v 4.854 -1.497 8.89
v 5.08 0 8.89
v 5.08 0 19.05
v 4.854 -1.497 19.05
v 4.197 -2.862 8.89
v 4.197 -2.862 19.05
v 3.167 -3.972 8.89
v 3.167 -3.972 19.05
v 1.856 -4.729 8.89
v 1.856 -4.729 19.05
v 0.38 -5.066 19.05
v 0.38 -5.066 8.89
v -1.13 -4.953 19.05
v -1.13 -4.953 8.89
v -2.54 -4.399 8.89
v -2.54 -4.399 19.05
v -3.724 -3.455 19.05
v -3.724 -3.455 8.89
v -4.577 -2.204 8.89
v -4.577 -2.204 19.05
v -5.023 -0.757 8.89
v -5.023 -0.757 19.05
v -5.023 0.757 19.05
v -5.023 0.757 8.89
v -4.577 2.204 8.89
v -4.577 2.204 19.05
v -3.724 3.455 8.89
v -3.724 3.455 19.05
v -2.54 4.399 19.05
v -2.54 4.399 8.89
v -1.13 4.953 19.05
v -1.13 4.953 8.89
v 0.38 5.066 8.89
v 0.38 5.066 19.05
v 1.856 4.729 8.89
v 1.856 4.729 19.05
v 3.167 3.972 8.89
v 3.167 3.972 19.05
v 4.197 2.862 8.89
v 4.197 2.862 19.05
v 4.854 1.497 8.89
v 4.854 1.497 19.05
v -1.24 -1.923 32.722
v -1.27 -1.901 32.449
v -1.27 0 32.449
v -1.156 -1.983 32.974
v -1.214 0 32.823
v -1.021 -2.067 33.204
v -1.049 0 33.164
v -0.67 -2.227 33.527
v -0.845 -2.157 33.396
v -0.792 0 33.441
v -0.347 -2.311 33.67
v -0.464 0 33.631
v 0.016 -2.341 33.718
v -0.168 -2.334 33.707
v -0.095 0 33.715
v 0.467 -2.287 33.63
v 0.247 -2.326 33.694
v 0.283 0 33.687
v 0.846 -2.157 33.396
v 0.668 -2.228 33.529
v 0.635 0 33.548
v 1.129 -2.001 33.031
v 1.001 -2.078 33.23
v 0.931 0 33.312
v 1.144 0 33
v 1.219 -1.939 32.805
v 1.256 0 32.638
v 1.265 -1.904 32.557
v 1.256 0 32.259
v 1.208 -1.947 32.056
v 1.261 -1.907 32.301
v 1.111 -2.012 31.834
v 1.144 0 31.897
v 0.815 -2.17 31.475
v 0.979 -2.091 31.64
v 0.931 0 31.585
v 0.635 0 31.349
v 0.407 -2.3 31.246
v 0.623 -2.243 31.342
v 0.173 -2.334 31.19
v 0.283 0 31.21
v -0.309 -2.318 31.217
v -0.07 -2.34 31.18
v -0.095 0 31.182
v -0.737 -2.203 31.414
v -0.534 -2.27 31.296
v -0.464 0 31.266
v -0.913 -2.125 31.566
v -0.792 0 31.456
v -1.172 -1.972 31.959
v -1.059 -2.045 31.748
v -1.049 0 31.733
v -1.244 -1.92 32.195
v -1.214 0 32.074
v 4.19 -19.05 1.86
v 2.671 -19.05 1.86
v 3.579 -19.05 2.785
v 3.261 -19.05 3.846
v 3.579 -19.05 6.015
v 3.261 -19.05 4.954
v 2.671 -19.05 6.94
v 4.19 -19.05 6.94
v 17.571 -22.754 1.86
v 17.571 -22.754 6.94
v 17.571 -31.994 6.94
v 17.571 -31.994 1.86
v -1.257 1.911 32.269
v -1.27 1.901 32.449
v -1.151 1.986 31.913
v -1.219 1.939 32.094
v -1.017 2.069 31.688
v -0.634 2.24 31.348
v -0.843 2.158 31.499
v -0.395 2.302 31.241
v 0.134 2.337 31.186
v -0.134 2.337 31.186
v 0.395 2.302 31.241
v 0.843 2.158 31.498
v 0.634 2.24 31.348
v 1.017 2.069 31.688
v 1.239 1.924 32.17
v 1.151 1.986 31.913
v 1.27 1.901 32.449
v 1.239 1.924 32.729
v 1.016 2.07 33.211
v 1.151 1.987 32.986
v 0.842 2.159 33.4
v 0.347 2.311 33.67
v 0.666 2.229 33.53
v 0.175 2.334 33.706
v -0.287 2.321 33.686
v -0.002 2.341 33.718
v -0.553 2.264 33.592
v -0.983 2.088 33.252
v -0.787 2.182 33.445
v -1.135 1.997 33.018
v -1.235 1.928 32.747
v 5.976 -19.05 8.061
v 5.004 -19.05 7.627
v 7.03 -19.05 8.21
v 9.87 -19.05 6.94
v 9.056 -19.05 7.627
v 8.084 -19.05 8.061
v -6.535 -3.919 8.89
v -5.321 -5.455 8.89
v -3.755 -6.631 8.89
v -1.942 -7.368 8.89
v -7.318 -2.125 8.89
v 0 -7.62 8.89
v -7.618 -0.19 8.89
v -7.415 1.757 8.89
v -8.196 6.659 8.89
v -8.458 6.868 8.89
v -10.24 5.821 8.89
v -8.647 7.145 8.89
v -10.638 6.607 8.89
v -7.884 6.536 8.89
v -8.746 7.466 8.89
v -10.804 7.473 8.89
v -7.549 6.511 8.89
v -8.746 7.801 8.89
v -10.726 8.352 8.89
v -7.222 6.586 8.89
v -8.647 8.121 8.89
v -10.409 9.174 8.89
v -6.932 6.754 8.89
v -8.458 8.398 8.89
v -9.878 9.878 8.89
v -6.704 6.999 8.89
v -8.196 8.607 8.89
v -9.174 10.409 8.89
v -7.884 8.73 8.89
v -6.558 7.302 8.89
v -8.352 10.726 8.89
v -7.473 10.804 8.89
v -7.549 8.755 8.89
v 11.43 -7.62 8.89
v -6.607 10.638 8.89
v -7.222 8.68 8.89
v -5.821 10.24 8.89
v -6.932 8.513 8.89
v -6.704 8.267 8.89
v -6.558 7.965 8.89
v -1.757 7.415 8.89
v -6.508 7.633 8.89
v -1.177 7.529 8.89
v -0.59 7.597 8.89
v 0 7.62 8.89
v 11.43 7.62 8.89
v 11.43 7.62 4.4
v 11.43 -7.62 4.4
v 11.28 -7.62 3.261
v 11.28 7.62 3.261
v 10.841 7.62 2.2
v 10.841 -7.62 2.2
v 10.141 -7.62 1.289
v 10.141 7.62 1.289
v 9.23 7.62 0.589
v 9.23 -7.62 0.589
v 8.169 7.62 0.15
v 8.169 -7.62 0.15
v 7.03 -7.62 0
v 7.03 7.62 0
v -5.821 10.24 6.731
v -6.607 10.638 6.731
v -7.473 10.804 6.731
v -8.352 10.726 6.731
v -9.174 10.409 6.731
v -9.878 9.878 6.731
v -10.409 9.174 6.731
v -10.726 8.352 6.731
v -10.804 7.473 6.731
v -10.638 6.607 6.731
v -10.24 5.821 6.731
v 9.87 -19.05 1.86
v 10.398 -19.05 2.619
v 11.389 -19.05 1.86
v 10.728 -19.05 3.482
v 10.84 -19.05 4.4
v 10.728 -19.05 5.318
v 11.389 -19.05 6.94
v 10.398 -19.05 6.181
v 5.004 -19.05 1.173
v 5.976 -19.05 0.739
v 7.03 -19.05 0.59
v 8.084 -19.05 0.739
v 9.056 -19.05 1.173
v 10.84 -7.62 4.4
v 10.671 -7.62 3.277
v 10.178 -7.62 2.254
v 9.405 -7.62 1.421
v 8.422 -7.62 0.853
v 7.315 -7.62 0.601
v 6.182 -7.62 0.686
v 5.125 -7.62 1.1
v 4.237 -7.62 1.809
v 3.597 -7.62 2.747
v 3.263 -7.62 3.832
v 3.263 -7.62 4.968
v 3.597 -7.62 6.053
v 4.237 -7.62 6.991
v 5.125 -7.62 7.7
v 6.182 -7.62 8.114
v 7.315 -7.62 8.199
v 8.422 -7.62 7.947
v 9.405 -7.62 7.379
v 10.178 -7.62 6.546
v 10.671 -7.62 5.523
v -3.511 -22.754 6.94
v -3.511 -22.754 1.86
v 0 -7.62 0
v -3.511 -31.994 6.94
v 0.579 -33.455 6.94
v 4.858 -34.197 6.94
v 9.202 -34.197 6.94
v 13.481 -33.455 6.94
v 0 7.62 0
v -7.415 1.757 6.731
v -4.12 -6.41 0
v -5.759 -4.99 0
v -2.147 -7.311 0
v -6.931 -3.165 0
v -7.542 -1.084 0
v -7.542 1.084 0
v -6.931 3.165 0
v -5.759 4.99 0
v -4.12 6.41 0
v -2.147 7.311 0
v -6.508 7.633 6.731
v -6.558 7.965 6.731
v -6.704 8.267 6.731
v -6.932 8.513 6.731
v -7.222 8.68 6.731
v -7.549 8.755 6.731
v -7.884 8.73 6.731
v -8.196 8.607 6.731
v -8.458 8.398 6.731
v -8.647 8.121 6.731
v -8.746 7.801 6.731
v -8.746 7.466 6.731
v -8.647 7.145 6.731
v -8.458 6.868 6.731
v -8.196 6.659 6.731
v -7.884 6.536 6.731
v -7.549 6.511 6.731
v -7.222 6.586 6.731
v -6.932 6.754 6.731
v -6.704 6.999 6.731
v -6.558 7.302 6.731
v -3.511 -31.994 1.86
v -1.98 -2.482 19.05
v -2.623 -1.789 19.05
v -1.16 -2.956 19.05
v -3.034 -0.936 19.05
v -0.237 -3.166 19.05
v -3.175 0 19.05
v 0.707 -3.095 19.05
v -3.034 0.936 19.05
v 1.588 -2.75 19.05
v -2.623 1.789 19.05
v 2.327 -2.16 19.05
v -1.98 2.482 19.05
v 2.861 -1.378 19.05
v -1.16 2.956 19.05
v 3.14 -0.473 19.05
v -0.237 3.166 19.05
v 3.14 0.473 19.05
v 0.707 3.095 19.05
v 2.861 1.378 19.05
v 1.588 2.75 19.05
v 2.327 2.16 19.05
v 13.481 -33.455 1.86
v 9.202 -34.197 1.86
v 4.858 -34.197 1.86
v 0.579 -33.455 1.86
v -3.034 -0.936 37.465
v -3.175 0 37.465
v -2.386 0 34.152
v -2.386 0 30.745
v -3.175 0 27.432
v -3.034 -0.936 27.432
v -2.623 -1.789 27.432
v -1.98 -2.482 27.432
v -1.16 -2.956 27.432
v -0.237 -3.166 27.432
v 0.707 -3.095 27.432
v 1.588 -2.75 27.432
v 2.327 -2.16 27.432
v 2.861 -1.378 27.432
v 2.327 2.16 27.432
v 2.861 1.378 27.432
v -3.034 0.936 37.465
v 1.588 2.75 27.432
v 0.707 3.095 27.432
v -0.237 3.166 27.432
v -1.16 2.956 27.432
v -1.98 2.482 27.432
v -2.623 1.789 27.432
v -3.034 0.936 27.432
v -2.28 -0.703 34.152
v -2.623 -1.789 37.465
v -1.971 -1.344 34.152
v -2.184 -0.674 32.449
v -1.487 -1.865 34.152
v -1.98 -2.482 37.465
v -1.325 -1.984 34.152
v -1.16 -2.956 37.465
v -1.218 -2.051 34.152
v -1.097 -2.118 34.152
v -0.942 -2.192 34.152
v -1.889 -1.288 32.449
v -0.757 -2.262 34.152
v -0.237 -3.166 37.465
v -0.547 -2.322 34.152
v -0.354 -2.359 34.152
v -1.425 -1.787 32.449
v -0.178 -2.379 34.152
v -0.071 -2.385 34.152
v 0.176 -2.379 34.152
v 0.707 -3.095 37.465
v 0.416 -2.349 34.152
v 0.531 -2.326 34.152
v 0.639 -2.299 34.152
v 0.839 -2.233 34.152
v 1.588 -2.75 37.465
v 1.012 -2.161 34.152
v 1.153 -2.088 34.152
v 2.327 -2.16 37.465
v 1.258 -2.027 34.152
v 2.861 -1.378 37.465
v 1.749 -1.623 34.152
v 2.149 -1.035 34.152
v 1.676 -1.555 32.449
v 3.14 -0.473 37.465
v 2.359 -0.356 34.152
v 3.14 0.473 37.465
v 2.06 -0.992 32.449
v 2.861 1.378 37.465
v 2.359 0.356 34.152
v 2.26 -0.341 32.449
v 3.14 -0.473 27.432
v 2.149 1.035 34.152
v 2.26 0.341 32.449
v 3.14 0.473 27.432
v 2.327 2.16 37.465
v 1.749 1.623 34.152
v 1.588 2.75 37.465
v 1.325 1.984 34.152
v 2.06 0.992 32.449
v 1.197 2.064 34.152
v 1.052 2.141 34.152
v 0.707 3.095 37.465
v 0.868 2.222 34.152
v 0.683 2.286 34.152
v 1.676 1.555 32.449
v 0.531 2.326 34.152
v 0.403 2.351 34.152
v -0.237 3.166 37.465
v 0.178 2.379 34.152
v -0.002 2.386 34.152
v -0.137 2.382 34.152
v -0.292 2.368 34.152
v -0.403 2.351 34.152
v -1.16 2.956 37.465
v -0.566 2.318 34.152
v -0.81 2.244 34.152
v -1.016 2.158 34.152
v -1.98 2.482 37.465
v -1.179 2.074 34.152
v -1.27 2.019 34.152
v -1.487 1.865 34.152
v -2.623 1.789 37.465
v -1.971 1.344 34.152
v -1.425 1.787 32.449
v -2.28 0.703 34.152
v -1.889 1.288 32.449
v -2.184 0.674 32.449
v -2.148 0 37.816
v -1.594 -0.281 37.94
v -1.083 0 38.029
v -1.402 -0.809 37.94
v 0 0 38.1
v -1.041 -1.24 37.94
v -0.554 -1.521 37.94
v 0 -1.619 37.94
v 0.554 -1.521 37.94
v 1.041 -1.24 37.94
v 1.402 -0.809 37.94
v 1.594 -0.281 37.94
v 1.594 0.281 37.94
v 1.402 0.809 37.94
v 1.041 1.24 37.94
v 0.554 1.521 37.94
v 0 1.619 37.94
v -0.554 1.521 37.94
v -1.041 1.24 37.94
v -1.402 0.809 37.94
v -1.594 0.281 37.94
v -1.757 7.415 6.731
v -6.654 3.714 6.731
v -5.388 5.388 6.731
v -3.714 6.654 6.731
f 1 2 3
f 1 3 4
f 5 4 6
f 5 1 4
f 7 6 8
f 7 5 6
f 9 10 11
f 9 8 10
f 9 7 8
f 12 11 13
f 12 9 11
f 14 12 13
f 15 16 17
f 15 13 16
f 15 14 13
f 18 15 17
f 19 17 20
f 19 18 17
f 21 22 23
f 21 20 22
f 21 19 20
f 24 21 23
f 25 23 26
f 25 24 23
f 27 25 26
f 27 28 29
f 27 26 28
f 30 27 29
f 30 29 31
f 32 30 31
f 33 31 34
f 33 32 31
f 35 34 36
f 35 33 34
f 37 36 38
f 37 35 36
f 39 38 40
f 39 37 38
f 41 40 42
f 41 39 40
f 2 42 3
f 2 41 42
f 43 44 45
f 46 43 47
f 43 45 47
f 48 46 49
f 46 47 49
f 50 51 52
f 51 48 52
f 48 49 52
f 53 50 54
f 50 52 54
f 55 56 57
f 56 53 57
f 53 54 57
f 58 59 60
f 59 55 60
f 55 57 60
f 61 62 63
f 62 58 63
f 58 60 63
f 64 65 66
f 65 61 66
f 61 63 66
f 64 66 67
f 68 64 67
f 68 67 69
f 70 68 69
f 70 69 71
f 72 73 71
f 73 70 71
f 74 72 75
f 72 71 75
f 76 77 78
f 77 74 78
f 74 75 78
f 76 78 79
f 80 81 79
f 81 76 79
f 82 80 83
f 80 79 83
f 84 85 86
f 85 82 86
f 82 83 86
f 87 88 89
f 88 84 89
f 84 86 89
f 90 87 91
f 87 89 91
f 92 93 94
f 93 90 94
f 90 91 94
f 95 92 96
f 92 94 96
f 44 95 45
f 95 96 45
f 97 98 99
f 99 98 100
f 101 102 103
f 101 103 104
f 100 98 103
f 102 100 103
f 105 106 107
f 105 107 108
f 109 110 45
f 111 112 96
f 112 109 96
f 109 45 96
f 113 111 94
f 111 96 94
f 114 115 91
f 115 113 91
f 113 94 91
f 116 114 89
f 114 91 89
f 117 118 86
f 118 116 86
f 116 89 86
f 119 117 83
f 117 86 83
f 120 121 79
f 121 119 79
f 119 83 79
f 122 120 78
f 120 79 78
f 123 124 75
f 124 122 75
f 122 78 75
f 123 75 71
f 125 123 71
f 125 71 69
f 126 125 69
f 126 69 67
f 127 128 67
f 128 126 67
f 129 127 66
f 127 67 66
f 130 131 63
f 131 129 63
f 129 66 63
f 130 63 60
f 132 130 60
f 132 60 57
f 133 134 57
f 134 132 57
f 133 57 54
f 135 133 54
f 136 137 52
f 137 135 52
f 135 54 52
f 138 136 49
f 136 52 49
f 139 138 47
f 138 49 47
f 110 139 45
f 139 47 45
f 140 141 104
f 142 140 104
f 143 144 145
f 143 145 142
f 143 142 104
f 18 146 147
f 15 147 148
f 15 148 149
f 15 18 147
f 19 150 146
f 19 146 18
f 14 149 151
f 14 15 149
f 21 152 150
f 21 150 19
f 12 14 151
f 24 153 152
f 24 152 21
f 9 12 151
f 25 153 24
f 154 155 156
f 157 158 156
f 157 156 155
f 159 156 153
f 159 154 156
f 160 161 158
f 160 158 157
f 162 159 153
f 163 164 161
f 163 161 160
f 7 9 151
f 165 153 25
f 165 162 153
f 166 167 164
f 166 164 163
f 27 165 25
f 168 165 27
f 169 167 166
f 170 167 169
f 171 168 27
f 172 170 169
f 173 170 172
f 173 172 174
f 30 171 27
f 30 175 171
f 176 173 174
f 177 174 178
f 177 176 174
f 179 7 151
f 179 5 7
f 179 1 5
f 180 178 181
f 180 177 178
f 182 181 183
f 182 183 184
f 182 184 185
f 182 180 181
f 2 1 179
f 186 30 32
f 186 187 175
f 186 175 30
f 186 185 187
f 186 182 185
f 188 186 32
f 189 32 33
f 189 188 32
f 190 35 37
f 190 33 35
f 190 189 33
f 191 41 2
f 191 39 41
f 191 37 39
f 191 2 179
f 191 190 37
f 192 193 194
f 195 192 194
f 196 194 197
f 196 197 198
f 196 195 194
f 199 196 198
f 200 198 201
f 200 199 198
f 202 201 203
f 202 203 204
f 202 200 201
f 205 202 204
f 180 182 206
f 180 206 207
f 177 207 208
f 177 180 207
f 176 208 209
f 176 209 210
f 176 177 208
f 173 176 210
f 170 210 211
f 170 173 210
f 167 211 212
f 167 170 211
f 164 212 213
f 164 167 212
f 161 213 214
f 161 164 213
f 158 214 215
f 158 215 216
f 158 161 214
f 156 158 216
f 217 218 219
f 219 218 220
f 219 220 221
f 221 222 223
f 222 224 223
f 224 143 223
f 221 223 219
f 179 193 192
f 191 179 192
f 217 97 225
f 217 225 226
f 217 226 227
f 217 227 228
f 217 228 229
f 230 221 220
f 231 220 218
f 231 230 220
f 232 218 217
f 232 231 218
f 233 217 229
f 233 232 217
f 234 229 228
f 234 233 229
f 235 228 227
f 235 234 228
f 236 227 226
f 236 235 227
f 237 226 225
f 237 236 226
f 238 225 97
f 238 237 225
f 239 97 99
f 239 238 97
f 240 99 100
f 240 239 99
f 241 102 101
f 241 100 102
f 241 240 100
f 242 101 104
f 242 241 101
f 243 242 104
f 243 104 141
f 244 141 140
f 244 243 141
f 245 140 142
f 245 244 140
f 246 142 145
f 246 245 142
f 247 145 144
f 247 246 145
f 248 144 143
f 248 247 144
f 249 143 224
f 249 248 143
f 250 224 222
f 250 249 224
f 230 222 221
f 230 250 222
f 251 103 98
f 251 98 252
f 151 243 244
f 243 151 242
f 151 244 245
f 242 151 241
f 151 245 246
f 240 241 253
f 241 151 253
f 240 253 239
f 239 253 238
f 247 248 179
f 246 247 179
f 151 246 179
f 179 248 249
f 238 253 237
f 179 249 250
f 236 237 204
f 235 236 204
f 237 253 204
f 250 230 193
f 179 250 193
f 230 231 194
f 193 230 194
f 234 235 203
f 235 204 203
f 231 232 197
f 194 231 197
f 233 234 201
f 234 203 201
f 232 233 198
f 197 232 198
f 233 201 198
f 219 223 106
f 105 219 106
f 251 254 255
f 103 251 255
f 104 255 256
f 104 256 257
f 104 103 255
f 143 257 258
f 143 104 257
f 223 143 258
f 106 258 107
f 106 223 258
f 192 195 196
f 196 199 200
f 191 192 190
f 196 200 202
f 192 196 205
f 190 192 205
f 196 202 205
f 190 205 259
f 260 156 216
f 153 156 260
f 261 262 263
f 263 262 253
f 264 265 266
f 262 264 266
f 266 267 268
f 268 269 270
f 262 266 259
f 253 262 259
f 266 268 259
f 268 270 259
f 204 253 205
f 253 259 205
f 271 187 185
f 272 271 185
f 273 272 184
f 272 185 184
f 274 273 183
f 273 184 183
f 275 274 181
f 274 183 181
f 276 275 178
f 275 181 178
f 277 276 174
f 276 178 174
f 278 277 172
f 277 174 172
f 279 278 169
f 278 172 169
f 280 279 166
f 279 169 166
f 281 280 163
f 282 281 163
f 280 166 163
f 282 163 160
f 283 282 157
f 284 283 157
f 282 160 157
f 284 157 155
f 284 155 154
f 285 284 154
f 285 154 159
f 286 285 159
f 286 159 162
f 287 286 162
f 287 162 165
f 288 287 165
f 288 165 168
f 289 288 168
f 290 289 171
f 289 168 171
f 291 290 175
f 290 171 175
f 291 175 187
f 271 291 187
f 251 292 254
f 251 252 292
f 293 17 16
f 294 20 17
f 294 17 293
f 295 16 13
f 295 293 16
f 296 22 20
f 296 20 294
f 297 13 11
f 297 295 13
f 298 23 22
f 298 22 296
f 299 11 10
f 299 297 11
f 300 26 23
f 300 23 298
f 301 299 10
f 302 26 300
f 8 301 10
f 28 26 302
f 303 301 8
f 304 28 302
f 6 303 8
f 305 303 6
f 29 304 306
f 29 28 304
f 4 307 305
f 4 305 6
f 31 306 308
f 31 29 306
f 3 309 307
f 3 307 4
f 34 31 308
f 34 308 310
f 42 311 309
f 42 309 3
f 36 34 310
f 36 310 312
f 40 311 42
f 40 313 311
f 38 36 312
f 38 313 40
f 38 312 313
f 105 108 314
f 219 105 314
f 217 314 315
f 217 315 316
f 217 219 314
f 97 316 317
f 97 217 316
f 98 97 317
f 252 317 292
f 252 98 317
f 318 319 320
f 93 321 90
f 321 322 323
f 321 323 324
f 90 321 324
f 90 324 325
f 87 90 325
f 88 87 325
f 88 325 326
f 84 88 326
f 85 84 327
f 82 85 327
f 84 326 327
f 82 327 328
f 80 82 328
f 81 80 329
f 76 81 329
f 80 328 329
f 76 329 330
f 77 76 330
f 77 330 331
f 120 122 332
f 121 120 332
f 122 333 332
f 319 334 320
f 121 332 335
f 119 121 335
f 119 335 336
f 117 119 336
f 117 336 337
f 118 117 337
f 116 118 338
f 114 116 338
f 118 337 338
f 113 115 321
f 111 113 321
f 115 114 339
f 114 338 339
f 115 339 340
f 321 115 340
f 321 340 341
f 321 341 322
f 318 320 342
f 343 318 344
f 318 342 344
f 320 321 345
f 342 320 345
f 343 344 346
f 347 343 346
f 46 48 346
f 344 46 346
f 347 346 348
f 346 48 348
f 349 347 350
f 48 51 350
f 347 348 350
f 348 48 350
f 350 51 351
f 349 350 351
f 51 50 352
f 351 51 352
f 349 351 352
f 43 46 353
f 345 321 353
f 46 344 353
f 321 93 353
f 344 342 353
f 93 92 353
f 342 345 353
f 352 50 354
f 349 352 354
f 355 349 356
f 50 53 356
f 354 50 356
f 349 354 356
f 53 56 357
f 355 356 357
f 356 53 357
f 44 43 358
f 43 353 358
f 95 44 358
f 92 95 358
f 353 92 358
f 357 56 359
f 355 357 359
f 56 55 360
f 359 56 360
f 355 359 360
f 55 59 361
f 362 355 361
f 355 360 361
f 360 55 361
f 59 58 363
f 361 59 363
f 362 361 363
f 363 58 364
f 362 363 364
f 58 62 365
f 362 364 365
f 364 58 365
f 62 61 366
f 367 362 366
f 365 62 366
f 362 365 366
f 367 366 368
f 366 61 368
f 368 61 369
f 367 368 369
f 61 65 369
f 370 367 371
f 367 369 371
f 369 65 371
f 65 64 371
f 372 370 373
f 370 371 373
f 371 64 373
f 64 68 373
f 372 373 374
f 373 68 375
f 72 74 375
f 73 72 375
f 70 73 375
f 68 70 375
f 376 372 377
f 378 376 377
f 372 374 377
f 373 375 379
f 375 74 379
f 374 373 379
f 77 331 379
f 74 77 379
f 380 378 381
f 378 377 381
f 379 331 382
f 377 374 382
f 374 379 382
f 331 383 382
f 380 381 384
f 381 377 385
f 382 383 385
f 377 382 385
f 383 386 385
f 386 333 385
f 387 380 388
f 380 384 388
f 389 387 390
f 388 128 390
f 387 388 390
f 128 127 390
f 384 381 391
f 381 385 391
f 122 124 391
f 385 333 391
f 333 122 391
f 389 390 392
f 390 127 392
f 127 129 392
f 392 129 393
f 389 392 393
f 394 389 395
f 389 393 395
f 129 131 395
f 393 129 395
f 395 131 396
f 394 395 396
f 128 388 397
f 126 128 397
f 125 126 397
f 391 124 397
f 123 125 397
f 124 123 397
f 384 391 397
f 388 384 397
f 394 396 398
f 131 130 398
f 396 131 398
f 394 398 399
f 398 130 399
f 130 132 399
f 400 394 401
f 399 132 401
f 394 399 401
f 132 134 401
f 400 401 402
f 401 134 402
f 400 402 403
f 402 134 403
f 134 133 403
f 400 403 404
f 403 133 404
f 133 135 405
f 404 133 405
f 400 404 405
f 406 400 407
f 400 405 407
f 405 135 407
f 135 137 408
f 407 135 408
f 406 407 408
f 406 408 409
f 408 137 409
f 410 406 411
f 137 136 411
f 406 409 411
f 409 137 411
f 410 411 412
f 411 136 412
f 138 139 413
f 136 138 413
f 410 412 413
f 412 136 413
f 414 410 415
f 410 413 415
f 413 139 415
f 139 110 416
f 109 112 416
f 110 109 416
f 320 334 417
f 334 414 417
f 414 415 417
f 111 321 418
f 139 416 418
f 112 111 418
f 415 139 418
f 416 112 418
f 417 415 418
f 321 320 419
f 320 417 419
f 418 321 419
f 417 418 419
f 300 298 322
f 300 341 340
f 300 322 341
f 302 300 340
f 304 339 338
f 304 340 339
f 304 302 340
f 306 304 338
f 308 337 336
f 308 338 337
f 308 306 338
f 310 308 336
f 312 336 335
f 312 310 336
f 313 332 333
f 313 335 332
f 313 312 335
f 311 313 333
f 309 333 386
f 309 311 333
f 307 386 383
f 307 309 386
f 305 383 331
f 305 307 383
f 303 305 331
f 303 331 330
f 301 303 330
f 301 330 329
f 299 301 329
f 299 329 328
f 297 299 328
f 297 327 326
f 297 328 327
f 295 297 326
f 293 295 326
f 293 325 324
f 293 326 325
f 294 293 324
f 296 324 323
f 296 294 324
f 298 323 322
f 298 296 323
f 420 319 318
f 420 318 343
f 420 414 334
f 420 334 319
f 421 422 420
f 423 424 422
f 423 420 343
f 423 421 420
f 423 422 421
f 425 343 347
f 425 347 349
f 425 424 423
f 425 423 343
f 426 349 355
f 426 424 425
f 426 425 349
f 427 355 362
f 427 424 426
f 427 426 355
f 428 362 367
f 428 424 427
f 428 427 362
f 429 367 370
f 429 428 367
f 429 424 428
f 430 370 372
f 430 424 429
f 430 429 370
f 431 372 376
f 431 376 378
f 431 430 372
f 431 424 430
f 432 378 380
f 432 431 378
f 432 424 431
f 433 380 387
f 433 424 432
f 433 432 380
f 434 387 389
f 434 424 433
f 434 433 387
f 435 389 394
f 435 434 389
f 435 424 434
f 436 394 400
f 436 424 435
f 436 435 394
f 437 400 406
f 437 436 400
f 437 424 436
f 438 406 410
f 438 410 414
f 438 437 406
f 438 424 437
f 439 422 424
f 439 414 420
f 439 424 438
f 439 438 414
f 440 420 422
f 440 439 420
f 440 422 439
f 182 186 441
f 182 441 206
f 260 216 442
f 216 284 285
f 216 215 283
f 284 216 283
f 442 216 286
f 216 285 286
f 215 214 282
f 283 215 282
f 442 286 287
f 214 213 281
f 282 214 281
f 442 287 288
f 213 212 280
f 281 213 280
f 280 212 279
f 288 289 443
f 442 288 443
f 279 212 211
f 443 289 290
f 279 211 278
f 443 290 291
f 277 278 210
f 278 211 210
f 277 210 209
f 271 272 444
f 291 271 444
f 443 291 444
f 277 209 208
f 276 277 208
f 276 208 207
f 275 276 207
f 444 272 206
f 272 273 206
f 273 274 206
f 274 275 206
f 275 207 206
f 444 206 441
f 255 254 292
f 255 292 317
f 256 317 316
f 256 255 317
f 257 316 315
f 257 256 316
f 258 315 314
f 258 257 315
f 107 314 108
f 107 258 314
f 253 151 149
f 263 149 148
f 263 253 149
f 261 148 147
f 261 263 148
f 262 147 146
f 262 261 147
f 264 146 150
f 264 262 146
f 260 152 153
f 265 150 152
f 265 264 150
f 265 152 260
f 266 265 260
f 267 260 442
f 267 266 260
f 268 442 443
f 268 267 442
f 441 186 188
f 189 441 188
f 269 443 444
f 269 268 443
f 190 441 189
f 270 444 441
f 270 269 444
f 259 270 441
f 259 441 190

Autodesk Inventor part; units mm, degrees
ref_plane "YZ Plane" through (0, 0, 0) normal (1, 0, 0) x (0, 1, 0)
ref_plane "XZ Plane" through (0, 0, 0) normal (0, 1, 0) x (-1, 0, 0)
ref_plane "XY Plane" through (0, 0, 0) normal (0, 0, 1) x (1, 0, 0)
sketch "Sketch1" plane through (0, 0, 0) normal (0, 0, 1) x (1, 0, 0)
  line L0 (11.43, 7.62) -> (0, 7.62)
  arc A0 (0, 7.62) -> (0, -7.62) centre (0, 0) ccw
  line L1 (0, -7.62) -> (11.43, -7.62)
  line L2 (11.43, -7.62) -> (11.43, 7.62)
  dimension "d0" = 15.24
  dimension "d2" = 11.43
extrude "Extrusion1" add sketch "Sketch1" along normal blind 8.89
sketch "Sketch2" plane through (0, 0, 8.89) normal (0, 0, 1) x (1, 0, 0)
  arc A0 (0, 7.62) -> (0, -7.62) centre (0, 0) ccw projected
  circle A1 centre (0, 0) radius 5.08
  dimension "d5" = 10.16
extrude "Extrusion2" add sketch "Sketch2" along normal blind 10.16
sketch "Sketch3" plane through (0, 0, 0) normal (0, 1, 0) x (-1, 0, 0)
  line L0 (7.62, 8.89) -> (7.62, 0) projected
  line L1 (7.62, 0) -> (-11.43, 0) projected
  line L2 (-11.43, 0) -> (-11.43, 8.89) projected
  line L3 (-11.43, 8.89) -> (-5.08, 8.89) projected
  line L4 (-5.08, 8.89) -> (-5.08, 19.05) projected
  line L5 (-5.08, 19.05) -> (5.08, 19.05) projected
  line L6 (5.08, 19.05) -> (5.08, 8.89) projected
  line L7 (5.08, 8.89) -> (7.62, 8.89) projected
  line L8 (0, 19.05) -> (0, 38.1)
  arc A0 (3.175, 37.465) -> (0, 38.1) centre (0, 29.845) ccw
  arc A1 (3.175, 37.465) -> (3.175, 27.432) centre (16.8842, 32.4485) ccw
  line L9 (3.175, 27.432) -> (3.175, 19.05)
  line L10 (3.175, 19.05) -> (0, 19.05)
  line L11 (16.8842, 32.4485) -> (2.286, 32.4485)
  point P0 (0, 0)
  dimension "d10" = 3.175
  dimension "d13" = 8.382
  dimension "d14" = 2.286
  dimension "d15" = 19.05
  dimension "d16" = 0.635
revolve "Revolution1" add sketch "Sketch3" angle 360 about axis through (0, 0, 19.05) along (0, 0, 1) contours L5 L8 A0 A1 L9
sketch "Sketch4" plane through (0, 0, 0) normal (0, 1, 0) x (-1, 0, 0)
  line L0 (7.62, 8.89) -> (7.62, 0) projected
  line L1 (7.62, 0) -> (-11.43, 0) projected
  line L2 (-11.43, 0) -> (-11.43, 8.89) projected
  line L3 (-11.43, 8.89) -> (-5.08, 8.89) projected
  line L4 (-5.08, 8.89) -> (-5.08, 19.05) projected
  line L5 (-5.08, 19.05) -> (-3.175, 19.05) projected
  line L6 (-3.175, 19.05) -> (-3.175, 27.432) projected
  arc A0 (-3.175, 27.432) -> (-3.175, 37.465) centre (-16.8842, 32.4485) ccw projected
  arc A1 (3.175, 37.465) -> (0, 38.1) centre (0, 29.845) ccw projected
  arc A2 (0, 38.1) -> (-3.175, 37.465) centre (0, 29.845) ccw projected
  arc A3 (3.175, 37.465) -> (3.175, 27.432) centre (16.8842, 32.4485) ccw projected
  line L7 (3.175, 27.432) -> (3.175, 19.05) projected
  line L8 (3.175, 19.05) -> (5.08, 19.05) projected
  line L9 (5.08, 19.05) -> (5.08, 8.89) projected
  line L10 (5.08, 8.89) -> (7.62, 8.89) projected
  circle A4 centre (0, 32.4485) radius 1.27
  point P0 (0, 0)
  point P1 (2.286, 32.4485)
  dimension "d18" = 2.54
extrude "Extrusion3" cut sketch "Sketch4" along normal through all both and the other way through all contours A4
sketch "Sketch5" plane through (0, 0, 8.89) normal (0, 0, 1) x (1, 0, 0)
  circle A0 centre (0, 0) radius 5.08 projected
  arc A1 (0, 7.62) -> (0, -7.62) centre (0, 0) ccw projected
  line L0 (-1.7571, 7.4147) -> (-5.8207, 10.24)
  arc A2 (-5.8207, 10.24) -> (-10.24, 5.8207) centre (-7.6332, 7.6332) ccw
  line L1 (-10.24, 5.8207) -> (-7.4147, 1.7571)
  circle A3 centre (-7.6332, 7.6332) radius 1.125
  circle A4 centre (0, 0) radius 10.795
  line L2 (0, 0) -> (-7.6332, 7.6332)
  line L3 (11.43, 7.62) -> (0, 7.62) projected
  dimension "d23" = 2.25
  dimension "d25" = 3.175
  dimension "d26" = 8.001
  dimension "d27" = 5.715
  dimension "d31" = 135
extrude "Extrusion4" add sketch "Sketch5" against normal blind 2.159 contours A1 L1 A4 A3 L2 | L2 A3 A4 L0 A1 | A4 A3 L1 A2 L0
fillet "Fillet1" radius 4.4 1 edges at (11.43, 0, 0)
sketch "Sketch6" plane through (0, -7.62, 8.89) normal (0, -1, 0) x (1, 0, 0)
  arc A0 (7.03, -8.89) -> (11.43, -4.49) centre (7.03, -4.49) ccw projected
  circle A1 centre (7.03, -4.49) radius 3.81
  dimension "d33" = 7.62
extrude "Extrusion5" add sketch "Sketch6" along normal blind 11.43
sketch "Sketch7" plane through (7.03, -19.05, 4.4) normal (0, -1, 0) x (1, 0, 0)
  circle A0 centre (0, 0) radius 3.81 projected
  line L0 (-10.541, 2.54) -> (10.541, 2.54)
  line L1 (10.541, 2.54) -> (10.541, -2.54)
  line L2 (10.541, -2.54) -> (-10.541, -2.54)
  line L3 (-10.541, -2.54) -> (-10.541, 2.54)
  point P0 (-7.03, -4.4)
  point P1 (0, 2.54)
  point P2 (10.541, 0)
  dimension "d37" = 21.082
  dimension "d40" = 5.08
extrude "Extrusion6" add sketch "Sketch7" along normal blind 15.24 contours A0 L2 L0 | A0 L0 L1 L2 | A0 L2 L3 L0
sketch "Sketch8" plane through (-3.511, -19.05, 6.94) normal (0, 0, 1) x (1, 0, 0)
  line L0 (0, 0) -> (7.7012, 0) projected
  line L1 (0, 0) -> (0, -15.24) projected
  line L2 (21.082, -15.24) -> (0, -15.24) projected
  line L3 (21.082, 0) -> (21.082, -15.24) projected
  line L4 (13.3808, 0) -> (21.082, 0) projected
  line L5 (7.7012, 0) -> (13.3808, 0) projected
  line L6 (6.1817, 0) -> (0, -3.7039)
  line L7 (14.9003, 0) -> (21.082, -3.7039)
  arc A0 (0, -12.9438) -> (21.082, -12.9438) centre (10.541, 10.1034) ccw
  point P0 (3.511, 19.05)
extrude "Extrusion7" cut sketch "Sketch8" against normal through all contours L0 L6 L1 | A0 L2 L1 | A0 L3 L2 | L4 L3 L7
properties part number "tuning peg"
